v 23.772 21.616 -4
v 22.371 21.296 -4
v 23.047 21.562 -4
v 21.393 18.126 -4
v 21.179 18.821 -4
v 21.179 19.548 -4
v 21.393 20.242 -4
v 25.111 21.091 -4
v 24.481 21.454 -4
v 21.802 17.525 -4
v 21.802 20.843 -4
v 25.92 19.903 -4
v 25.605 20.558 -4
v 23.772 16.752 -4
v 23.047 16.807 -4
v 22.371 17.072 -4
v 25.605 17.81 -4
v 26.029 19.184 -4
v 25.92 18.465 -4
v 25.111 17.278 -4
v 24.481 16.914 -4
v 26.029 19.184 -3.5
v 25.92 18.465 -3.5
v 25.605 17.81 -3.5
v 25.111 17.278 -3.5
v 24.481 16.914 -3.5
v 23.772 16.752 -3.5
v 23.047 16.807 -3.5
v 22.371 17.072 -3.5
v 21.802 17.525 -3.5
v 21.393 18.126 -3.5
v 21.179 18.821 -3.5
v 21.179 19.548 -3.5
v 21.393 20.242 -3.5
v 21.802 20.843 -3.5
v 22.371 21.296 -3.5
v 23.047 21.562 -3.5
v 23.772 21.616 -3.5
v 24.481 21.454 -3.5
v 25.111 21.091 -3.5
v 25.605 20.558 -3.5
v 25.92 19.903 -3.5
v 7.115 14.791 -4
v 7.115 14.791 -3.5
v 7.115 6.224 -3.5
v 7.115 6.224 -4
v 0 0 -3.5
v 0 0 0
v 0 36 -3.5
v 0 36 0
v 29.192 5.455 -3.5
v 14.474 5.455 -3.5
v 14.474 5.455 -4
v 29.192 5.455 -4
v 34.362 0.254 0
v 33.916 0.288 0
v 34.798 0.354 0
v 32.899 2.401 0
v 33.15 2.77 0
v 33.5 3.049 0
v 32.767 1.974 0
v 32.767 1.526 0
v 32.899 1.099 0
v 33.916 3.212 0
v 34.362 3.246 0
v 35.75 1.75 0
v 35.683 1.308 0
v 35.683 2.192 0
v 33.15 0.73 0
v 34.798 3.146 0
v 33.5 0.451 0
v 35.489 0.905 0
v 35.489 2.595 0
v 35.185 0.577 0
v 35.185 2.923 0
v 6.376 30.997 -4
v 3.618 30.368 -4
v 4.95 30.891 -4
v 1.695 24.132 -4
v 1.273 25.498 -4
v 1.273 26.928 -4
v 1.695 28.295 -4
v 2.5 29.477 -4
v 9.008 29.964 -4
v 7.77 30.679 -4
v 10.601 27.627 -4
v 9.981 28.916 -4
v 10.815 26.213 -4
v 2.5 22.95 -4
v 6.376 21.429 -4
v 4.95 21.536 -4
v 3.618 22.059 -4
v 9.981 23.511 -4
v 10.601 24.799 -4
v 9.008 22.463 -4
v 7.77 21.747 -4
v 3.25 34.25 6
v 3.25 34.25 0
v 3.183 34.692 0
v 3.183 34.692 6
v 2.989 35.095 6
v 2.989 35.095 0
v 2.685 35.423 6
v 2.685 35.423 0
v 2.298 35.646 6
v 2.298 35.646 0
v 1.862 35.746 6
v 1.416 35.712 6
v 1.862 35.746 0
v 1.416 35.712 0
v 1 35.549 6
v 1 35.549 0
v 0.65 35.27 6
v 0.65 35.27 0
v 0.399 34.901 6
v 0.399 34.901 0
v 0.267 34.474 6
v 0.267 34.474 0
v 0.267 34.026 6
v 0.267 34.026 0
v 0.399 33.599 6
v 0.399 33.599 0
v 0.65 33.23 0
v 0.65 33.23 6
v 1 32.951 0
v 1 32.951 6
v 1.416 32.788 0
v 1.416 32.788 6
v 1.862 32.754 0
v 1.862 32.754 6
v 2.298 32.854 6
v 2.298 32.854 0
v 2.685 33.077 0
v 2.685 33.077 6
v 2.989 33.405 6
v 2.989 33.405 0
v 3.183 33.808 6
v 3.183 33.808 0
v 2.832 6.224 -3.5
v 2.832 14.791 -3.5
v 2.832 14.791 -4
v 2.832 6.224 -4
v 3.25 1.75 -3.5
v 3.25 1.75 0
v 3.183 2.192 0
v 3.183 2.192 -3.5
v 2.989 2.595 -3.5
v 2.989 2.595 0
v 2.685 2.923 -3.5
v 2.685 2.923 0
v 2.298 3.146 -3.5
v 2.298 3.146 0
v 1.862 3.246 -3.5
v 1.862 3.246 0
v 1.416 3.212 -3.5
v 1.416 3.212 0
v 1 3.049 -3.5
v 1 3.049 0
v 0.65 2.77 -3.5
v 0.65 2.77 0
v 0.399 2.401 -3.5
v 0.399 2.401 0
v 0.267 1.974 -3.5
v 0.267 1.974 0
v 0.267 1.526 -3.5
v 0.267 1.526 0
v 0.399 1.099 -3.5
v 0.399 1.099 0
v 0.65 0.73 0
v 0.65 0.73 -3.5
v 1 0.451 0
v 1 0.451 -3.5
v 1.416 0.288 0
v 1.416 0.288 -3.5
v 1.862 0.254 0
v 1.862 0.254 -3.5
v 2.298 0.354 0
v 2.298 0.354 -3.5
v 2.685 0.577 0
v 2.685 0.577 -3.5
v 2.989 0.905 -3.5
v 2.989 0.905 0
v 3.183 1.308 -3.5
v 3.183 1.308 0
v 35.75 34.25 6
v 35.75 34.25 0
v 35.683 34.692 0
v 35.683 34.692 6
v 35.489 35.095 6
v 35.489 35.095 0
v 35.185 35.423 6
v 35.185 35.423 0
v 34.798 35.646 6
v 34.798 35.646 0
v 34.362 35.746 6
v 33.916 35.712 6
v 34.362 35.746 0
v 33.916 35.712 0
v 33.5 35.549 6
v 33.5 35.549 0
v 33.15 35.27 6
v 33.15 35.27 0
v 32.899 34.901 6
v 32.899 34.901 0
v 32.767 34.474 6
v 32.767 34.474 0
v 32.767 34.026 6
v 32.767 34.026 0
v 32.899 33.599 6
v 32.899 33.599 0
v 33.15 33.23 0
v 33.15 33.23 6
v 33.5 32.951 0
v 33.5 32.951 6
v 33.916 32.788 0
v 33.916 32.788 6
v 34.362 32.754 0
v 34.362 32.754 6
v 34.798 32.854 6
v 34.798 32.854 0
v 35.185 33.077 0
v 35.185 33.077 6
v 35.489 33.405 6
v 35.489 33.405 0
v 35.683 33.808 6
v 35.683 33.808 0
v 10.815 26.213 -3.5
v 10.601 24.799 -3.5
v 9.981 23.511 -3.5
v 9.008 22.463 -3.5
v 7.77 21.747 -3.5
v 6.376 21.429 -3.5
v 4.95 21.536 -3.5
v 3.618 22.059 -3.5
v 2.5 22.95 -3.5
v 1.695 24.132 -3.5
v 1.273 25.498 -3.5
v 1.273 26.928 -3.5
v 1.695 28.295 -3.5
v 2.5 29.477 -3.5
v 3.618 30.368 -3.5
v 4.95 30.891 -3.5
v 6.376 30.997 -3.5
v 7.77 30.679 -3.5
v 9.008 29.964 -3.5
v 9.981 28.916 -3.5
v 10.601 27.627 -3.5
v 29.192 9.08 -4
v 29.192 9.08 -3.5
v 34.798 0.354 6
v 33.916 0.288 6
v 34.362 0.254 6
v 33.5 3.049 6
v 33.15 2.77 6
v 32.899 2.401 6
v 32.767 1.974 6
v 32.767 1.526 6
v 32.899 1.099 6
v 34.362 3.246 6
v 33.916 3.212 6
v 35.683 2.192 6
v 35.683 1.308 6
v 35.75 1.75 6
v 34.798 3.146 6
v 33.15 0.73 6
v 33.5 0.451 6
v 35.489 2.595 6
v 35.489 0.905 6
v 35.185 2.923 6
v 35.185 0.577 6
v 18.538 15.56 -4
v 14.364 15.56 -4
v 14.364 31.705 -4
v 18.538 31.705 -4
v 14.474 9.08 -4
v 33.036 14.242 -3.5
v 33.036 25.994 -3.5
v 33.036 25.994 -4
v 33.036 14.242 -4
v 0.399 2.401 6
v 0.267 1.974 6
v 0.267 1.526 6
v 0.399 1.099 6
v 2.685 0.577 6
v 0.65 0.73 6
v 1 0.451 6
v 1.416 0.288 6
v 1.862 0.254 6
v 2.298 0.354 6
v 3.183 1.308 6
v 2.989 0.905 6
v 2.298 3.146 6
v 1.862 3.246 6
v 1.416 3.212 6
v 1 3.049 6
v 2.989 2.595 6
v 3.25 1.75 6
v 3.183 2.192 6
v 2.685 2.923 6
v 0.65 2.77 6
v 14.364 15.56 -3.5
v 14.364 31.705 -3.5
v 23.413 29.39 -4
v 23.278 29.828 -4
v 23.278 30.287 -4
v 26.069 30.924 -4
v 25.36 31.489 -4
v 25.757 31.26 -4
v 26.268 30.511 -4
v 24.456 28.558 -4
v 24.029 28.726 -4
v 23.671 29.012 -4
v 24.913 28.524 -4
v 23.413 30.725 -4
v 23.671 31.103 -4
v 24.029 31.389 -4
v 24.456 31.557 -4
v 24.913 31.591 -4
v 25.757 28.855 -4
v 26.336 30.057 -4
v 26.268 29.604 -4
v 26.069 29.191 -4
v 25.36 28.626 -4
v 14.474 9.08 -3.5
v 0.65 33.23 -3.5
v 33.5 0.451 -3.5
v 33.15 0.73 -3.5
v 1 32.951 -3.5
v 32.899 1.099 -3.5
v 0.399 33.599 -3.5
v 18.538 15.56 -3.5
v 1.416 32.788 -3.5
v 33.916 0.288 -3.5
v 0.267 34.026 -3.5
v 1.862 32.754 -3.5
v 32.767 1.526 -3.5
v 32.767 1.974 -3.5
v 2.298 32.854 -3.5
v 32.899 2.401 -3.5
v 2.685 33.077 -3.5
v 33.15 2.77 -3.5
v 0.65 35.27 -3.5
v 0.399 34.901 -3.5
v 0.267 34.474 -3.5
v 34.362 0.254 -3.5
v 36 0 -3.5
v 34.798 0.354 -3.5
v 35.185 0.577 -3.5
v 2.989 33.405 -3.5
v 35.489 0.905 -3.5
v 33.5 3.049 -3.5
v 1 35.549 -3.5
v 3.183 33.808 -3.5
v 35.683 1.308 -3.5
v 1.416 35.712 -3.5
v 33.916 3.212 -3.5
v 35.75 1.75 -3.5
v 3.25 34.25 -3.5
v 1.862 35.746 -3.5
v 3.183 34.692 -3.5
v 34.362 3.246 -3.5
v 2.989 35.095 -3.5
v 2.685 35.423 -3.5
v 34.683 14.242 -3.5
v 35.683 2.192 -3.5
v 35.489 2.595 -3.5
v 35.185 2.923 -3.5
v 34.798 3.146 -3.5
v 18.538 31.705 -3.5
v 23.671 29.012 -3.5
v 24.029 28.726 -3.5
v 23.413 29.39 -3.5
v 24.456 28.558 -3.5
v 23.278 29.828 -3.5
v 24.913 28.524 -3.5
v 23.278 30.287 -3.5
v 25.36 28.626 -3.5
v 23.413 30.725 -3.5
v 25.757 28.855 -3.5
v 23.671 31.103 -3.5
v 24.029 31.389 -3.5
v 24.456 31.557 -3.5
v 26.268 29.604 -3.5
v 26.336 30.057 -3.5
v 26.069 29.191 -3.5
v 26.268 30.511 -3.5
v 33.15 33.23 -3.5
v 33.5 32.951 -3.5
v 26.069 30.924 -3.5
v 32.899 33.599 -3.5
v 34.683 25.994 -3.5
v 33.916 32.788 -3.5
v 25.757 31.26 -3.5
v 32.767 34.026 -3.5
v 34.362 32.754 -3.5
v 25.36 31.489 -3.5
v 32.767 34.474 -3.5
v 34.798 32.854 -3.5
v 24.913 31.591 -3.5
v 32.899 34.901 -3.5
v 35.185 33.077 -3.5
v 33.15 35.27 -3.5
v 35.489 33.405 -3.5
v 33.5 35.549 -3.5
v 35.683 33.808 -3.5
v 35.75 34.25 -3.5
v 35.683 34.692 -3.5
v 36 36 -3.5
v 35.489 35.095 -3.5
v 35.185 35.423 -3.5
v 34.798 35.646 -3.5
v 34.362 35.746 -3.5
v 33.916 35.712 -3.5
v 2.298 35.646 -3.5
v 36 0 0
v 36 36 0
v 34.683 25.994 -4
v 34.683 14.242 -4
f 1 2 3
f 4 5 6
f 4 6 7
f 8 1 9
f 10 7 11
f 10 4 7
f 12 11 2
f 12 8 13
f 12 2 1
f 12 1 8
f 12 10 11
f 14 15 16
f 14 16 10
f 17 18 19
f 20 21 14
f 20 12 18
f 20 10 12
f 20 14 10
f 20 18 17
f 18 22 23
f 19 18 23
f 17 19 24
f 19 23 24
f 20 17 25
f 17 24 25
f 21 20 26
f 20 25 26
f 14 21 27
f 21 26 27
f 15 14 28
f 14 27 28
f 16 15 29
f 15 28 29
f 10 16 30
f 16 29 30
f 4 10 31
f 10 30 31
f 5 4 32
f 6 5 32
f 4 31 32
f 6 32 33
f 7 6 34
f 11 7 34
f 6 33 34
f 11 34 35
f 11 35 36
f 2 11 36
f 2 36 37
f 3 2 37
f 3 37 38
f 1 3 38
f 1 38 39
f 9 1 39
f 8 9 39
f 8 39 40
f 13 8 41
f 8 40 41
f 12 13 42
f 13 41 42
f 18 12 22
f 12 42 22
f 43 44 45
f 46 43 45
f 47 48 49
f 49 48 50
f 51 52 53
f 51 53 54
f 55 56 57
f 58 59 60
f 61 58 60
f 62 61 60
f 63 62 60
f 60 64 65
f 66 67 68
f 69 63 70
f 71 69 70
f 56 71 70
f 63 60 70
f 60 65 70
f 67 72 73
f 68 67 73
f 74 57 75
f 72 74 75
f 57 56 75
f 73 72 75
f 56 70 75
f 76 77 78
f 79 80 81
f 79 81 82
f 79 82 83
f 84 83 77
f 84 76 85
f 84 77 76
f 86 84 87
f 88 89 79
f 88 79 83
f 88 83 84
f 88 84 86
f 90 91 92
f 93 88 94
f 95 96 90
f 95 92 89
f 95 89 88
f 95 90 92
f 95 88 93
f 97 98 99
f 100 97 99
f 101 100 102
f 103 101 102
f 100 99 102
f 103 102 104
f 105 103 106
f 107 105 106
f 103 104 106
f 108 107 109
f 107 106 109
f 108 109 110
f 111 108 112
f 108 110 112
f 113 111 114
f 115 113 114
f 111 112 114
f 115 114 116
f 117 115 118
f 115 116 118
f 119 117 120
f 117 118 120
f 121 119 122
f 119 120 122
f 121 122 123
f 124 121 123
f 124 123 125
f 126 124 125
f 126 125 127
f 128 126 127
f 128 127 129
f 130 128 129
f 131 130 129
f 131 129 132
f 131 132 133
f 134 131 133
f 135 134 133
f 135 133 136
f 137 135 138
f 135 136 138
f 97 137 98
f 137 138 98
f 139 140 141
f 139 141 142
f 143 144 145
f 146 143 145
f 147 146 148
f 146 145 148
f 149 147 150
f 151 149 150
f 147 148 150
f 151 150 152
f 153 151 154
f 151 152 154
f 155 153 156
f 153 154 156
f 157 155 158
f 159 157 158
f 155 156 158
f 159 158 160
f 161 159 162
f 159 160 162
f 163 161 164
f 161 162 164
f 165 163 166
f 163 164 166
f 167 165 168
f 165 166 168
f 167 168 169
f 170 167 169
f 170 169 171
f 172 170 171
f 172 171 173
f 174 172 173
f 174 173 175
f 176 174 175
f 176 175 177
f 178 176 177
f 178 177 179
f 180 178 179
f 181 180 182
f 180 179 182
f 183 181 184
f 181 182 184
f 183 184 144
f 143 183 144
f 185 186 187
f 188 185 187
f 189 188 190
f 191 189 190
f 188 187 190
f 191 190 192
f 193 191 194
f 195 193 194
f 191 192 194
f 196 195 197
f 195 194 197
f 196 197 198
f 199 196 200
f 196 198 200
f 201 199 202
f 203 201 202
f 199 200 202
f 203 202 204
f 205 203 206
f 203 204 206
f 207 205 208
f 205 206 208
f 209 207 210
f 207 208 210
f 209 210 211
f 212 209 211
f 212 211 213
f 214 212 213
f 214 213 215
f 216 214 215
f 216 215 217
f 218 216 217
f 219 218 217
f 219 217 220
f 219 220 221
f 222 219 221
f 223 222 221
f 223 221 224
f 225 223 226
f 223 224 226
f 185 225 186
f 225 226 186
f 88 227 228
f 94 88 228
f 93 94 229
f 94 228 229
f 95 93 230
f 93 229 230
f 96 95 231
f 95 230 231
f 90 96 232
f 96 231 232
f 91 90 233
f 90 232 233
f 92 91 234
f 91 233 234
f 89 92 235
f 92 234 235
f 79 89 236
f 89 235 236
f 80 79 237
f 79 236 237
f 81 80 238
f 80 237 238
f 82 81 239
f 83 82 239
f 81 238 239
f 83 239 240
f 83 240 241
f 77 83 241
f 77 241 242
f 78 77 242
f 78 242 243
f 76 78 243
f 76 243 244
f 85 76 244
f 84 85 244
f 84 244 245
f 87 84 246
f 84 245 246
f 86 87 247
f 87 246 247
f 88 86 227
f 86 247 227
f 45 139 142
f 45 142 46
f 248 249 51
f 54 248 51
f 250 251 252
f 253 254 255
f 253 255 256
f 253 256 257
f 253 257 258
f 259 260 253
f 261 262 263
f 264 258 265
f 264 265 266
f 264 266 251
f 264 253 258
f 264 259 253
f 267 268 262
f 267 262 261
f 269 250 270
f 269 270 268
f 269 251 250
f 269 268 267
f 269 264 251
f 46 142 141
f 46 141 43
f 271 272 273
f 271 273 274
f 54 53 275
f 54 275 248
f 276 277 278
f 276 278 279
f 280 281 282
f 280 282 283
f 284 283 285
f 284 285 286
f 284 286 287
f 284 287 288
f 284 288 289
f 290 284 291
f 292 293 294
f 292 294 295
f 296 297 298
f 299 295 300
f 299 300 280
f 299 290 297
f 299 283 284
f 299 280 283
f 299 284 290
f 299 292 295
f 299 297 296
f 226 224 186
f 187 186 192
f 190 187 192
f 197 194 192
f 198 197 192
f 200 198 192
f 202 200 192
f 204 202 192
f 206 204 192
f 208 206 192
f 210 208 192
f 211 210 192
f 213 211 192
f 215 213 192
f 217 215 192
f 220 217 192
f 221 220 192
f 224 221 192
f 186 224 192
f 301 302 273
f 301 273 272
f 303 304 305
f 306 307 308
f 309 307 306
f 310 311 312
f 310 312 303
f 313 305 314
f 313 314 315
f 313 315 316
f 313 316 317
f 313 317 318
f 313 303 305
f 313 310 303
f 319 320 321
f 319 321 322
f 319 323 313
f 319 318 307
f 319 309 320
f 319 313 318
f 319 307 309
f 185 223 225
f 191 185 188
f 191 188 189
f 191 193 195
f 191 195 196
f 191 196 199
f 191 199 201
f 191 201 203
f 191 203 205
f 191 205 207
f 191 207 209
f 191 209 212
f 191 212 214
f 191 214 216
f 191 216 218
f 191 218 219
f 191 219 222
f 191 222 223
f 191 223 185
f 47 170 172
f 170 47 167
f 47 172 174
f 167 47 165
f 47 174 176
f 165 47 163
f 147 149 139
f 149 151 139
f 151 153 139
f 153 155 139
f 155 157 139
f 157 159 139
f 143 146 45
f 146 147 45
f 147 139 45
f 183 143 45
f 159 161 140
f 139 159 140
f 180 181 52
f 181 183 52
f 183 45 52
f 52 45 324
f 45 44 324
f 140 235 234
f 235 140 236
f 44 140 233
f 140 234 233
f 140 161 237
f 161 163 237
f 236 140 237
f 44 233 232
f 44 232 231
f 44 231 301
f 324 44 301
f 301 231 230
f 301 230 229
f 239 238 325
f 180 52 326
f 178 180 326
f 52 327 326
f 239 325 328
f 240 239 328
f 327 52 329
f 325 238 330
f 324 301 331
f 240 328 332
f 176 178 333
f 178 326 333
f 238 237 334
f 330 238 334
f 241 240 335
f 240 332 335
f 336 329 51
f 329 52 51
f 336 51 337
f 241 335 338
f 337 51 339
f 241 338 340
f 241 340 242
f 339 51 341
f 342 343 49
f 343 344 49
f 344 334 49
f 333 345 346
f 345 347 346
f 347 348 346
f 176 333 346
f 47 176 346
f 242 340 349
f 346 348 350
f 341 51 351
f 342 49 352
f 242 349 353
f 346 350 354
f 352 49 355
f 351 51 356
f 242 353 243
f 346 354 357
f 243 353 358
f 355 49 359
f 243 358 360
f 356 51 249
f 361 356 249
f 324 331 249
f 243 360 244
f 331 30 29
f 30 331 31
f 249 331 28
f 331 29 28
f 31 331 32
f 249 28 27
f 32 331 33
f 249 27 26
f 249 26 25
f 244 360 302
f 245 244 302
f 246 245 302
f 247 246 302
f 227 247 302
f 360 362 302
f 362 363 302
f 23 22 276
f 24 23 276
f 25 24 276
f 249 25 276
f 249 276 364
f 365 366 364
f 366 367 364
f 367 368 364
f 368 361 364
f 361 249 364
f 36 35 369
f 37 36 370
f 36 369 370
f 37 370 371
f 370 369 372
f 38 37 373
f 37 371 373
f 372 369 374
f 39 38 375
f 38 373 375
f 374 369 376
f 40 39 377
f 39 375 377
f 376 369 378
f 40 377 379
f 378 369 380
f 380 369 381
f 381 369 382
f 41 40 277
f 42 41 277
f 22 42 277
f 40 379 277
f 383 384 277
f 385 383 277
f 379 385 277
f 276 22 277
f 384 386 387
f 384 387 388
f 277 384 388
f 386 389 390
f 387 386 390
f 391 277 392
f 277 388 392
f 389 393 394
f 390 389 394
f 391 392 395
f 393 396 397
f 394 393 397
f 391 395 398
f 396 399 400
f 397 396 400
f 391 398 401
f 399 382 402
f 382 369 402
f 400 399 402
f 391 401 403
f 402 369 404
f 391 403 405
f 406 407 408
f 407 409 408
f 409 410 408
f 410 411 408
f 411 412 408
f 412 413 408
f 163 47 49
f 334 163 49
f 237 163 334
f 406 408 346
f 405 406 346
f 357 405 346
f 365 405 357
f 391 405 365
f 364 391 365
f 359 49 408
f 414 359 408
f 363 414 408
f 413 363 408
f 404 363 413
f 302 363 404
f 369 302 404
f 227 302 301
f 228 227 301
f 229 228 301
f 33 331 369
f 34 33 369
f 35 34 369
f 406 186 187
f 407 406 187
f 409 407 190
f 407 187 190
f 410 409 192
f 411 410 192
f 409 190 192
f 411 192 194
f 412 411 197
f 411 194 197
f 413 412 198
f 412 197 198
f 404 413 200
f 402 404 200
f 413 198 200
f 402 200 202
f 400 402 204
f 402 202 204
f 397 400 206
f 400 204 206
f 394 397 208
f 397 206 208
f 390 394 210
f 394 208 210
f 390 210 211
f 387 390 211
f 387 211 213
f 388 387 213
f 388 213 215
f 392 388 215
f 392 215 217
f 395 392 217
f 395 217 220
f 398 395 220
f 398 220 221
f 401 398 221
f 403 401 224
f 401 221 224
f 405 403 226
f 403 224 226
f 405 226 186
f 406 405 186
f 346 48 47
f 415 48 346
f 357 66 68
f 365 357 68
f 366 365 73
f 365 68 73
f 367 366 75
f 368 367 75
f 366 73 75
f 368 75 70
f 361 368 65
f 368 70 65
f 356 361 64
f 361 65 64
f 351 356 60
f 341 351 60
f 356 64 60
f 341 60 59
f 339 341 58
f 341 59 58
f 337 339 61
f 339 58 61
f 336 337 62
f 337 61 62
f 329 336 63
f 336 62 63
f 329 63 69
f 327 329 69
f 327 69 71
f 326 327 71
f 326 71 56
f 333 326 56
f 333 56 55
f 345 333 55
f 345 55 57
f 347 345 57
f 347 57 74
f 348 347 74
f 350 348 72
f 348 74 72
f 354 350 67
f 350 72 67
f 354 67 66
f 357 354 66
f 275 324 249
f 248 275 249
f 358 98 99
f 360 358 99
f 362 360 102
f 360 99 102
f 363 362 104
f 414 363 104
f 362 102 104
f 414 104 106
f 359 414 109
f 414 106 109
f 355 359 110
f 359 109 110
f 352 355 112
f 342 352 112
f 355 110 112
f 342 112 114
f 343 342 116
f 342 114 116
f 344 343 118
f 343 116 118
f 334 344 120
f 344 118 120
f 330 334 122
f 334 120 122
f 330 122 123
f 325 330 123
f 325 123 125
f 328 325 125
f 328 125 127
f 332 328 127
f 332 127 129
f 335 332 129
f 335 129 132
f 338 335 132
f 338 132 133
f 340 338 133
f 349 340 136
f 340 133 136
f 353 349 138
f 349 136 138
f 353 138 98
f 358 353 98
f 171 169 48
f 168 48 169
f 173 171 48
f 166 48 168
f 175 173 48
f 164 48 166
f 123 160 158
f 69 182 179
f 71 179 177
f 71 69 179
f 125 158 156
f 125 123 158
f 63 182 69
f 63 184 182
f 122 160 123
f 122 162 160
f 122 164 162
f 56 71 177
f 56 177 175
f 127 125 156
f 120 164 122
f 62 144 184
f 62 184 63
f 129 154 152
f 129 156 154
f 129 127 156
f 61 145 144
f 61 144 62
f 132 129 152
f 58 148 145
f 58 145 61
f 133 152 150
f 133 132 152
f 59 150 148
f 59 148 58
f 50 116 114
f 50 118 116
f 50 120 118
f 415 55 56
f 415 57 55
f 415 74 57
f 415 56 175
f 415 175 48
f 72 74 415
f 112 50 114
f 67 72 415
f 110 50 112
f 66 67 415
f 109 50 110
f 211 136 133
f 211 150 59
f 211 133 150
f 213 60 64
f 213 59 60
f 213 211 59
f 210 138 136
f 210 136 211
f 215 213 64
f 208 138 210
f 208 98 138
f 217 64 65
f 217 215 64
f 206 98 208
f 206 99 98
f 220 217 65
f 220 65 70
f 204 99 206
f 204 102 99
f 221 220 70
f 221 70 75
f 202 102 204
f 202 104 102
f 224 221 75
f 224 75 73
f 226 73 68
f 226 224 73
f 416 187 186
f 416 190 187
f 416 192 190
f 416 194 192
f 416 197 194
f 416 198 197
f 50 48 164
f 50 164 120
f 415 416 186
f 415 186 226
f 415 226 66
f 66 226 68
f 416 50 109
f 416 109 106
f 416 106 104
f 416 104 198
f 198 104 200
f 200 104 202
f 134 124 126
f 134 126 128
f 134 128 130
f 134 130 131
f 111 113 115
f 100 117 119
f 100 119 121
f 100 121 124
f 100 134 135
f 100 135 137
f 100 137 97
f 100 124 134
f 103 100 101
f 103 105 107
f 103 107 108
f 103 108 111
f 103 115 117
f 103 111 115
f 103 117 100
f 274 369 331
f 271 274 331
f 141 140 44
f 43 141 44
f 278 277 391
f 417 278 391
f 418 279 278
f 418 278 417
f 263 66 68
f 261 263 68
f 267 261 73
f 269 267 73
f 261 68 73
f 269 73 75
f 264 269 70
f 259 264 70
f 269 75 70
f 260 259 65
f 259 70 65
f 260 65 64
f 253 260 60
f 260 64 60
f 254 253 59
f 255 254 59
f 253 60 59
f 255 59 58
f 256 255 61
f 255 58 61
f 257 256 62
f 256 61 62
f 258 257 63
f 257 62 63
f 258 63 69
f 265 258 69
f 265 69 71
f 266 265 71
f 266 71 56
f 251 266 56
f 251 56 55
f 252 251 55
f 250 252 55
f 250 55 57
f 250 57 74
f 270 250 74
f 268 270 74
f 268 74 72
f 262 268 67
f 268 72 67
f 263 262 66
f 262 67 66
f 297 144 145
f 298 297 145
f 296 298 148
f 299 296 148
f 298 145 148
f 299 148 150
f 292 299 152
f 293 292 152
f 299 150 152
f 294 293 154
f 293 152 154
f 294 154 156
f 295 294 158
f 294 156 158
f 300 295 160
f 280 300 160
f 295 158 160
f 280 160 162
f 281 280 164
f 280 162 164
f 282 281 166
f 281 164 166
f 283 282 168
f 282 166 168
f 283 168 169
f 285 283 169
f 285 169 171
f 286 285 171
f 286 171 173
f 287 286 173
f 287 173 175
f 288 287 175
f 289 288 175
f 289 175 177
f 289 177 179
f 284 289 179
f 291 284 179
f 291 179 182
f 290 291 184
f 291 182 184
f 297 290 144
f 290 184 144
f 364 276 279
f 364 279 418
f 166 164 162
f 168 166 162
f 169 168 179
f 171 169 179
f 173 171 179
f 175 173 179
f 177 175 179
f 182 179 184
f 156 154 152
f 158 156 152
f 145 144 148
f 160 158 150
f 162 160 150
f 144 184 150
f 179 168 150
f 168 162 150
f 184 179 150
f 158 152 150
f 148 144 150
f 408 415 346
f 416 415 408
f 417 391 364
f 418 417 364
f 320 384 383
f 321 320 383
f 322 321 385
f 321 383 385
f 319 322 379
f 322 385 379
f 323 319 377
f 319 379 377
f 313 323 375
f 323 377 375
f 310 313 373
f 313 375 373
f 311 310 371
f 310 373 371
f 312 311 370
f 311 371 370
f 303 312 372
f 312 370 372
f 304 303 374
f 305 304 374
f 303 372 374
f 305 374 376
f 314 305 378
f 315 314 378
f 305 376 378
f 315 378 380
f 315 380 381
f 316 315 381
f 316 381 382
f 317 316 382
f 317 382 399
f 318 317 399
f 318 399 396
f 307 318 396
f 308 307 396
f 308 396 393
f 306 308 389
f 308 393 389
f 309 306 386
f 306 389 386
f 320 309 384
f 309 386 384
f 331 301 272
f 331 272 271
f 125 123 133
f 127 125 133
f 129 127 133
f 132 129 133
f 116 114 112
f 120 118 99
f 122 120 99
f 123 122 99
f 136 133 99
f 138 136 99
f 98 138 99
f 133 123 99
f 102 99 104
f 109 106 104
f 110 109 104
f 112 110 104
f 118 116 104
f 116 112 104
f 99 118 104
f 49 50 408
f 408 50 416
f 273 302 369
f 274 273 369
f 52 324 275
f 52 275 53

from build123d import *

# Parameters (mm, degrees)
F0_R     = 1.5
F1_DEPTH = 6
F0_W     = 36
F0_H     = 36
F2_DEPTH = 3.5
F3_W     = 4.283436
F3_H     = 8.566872
F3_W_2   = 14.717445
F3_H_2   = 3.624444
F3_R     = 2.438662
F3_W_3   = 1.64748
F3_H_3   = 11.75199
F3_R_2   = 1.537643
F3_W_4   = 4.173603
F3_H_4   = 16.145259
F3_R_3   = 4.79752
F4_DEPTH = 0.5


with BuildPart() as f1:
    # F0 (on Top) → F1 (new body)
    with BuildSketch(Plane.XY):
        with Locations((1.75, 34.25)):
            Circle(F0_R)
        with Locations((34.25, 34.25)):
            Circle(F0_R)
        with Locations((34.25, 1.75)):
            Circle(F0_R)
        with Locations((1.75, 1.75)):
            Circle(F0_R)
    extrude(amount=F1_DEPTH)


with BuildPart() as f2:
    # F0 (on Top) → F2 (new body)
    with BuildSketch(Plane.XY):
        with Locations((18, 18)):
            Rectangle(F0_W, F0_H)
        with Locations((1.75, 1.75)):
            Circle(F0_R, mode=Mode.SUBTRACT)
        with Locations((34.25, 1.75)):
            Circle(F0_R, mode=Mode.SUBTRACT)
        with Locations((1.75, 34.25)):
            Circle(F0_R, mode=Mode.SUBTRACT)
        with Locations((34.25, 34.25)):
            Circle(F0_R, mode=Mode.SUBTRACT)
    extrude(amount=-F2_DEPTH)

    # F3 (on face) → F4 (join)
    with BuildSketch(Plane(origin=(0, 0, -3.5), x_dir=(1, 0, 0), z_dir=(0, 0, -1))):
        with Locations((4.973674, -10.507443)):
            Rectangle(F3_W, F3_H)
        with Locations((21.832836, -7.267408)):
            Rectangle(F3_W_2, F3_H_2)
        with Locations((23.590142, -19.184146)):
            Circle(F3_R)
        with Locations((33.859406, -20.117715)):
            Rectangle(F3_W_3, F3_H_3)
        with Locations((24.798293, -30.057482)):
            Circle(F3_R_2)
        with Locations((16.451085, -23.632329)):
            Rectangle(F3_W_4, F3_H_4)
        with Locations((6.017075, -26.213372)):
            Circle(F3_R_3)
    extrude(amount=F4_DEPTH)


solid = Compound([f1.part, f2.part])
